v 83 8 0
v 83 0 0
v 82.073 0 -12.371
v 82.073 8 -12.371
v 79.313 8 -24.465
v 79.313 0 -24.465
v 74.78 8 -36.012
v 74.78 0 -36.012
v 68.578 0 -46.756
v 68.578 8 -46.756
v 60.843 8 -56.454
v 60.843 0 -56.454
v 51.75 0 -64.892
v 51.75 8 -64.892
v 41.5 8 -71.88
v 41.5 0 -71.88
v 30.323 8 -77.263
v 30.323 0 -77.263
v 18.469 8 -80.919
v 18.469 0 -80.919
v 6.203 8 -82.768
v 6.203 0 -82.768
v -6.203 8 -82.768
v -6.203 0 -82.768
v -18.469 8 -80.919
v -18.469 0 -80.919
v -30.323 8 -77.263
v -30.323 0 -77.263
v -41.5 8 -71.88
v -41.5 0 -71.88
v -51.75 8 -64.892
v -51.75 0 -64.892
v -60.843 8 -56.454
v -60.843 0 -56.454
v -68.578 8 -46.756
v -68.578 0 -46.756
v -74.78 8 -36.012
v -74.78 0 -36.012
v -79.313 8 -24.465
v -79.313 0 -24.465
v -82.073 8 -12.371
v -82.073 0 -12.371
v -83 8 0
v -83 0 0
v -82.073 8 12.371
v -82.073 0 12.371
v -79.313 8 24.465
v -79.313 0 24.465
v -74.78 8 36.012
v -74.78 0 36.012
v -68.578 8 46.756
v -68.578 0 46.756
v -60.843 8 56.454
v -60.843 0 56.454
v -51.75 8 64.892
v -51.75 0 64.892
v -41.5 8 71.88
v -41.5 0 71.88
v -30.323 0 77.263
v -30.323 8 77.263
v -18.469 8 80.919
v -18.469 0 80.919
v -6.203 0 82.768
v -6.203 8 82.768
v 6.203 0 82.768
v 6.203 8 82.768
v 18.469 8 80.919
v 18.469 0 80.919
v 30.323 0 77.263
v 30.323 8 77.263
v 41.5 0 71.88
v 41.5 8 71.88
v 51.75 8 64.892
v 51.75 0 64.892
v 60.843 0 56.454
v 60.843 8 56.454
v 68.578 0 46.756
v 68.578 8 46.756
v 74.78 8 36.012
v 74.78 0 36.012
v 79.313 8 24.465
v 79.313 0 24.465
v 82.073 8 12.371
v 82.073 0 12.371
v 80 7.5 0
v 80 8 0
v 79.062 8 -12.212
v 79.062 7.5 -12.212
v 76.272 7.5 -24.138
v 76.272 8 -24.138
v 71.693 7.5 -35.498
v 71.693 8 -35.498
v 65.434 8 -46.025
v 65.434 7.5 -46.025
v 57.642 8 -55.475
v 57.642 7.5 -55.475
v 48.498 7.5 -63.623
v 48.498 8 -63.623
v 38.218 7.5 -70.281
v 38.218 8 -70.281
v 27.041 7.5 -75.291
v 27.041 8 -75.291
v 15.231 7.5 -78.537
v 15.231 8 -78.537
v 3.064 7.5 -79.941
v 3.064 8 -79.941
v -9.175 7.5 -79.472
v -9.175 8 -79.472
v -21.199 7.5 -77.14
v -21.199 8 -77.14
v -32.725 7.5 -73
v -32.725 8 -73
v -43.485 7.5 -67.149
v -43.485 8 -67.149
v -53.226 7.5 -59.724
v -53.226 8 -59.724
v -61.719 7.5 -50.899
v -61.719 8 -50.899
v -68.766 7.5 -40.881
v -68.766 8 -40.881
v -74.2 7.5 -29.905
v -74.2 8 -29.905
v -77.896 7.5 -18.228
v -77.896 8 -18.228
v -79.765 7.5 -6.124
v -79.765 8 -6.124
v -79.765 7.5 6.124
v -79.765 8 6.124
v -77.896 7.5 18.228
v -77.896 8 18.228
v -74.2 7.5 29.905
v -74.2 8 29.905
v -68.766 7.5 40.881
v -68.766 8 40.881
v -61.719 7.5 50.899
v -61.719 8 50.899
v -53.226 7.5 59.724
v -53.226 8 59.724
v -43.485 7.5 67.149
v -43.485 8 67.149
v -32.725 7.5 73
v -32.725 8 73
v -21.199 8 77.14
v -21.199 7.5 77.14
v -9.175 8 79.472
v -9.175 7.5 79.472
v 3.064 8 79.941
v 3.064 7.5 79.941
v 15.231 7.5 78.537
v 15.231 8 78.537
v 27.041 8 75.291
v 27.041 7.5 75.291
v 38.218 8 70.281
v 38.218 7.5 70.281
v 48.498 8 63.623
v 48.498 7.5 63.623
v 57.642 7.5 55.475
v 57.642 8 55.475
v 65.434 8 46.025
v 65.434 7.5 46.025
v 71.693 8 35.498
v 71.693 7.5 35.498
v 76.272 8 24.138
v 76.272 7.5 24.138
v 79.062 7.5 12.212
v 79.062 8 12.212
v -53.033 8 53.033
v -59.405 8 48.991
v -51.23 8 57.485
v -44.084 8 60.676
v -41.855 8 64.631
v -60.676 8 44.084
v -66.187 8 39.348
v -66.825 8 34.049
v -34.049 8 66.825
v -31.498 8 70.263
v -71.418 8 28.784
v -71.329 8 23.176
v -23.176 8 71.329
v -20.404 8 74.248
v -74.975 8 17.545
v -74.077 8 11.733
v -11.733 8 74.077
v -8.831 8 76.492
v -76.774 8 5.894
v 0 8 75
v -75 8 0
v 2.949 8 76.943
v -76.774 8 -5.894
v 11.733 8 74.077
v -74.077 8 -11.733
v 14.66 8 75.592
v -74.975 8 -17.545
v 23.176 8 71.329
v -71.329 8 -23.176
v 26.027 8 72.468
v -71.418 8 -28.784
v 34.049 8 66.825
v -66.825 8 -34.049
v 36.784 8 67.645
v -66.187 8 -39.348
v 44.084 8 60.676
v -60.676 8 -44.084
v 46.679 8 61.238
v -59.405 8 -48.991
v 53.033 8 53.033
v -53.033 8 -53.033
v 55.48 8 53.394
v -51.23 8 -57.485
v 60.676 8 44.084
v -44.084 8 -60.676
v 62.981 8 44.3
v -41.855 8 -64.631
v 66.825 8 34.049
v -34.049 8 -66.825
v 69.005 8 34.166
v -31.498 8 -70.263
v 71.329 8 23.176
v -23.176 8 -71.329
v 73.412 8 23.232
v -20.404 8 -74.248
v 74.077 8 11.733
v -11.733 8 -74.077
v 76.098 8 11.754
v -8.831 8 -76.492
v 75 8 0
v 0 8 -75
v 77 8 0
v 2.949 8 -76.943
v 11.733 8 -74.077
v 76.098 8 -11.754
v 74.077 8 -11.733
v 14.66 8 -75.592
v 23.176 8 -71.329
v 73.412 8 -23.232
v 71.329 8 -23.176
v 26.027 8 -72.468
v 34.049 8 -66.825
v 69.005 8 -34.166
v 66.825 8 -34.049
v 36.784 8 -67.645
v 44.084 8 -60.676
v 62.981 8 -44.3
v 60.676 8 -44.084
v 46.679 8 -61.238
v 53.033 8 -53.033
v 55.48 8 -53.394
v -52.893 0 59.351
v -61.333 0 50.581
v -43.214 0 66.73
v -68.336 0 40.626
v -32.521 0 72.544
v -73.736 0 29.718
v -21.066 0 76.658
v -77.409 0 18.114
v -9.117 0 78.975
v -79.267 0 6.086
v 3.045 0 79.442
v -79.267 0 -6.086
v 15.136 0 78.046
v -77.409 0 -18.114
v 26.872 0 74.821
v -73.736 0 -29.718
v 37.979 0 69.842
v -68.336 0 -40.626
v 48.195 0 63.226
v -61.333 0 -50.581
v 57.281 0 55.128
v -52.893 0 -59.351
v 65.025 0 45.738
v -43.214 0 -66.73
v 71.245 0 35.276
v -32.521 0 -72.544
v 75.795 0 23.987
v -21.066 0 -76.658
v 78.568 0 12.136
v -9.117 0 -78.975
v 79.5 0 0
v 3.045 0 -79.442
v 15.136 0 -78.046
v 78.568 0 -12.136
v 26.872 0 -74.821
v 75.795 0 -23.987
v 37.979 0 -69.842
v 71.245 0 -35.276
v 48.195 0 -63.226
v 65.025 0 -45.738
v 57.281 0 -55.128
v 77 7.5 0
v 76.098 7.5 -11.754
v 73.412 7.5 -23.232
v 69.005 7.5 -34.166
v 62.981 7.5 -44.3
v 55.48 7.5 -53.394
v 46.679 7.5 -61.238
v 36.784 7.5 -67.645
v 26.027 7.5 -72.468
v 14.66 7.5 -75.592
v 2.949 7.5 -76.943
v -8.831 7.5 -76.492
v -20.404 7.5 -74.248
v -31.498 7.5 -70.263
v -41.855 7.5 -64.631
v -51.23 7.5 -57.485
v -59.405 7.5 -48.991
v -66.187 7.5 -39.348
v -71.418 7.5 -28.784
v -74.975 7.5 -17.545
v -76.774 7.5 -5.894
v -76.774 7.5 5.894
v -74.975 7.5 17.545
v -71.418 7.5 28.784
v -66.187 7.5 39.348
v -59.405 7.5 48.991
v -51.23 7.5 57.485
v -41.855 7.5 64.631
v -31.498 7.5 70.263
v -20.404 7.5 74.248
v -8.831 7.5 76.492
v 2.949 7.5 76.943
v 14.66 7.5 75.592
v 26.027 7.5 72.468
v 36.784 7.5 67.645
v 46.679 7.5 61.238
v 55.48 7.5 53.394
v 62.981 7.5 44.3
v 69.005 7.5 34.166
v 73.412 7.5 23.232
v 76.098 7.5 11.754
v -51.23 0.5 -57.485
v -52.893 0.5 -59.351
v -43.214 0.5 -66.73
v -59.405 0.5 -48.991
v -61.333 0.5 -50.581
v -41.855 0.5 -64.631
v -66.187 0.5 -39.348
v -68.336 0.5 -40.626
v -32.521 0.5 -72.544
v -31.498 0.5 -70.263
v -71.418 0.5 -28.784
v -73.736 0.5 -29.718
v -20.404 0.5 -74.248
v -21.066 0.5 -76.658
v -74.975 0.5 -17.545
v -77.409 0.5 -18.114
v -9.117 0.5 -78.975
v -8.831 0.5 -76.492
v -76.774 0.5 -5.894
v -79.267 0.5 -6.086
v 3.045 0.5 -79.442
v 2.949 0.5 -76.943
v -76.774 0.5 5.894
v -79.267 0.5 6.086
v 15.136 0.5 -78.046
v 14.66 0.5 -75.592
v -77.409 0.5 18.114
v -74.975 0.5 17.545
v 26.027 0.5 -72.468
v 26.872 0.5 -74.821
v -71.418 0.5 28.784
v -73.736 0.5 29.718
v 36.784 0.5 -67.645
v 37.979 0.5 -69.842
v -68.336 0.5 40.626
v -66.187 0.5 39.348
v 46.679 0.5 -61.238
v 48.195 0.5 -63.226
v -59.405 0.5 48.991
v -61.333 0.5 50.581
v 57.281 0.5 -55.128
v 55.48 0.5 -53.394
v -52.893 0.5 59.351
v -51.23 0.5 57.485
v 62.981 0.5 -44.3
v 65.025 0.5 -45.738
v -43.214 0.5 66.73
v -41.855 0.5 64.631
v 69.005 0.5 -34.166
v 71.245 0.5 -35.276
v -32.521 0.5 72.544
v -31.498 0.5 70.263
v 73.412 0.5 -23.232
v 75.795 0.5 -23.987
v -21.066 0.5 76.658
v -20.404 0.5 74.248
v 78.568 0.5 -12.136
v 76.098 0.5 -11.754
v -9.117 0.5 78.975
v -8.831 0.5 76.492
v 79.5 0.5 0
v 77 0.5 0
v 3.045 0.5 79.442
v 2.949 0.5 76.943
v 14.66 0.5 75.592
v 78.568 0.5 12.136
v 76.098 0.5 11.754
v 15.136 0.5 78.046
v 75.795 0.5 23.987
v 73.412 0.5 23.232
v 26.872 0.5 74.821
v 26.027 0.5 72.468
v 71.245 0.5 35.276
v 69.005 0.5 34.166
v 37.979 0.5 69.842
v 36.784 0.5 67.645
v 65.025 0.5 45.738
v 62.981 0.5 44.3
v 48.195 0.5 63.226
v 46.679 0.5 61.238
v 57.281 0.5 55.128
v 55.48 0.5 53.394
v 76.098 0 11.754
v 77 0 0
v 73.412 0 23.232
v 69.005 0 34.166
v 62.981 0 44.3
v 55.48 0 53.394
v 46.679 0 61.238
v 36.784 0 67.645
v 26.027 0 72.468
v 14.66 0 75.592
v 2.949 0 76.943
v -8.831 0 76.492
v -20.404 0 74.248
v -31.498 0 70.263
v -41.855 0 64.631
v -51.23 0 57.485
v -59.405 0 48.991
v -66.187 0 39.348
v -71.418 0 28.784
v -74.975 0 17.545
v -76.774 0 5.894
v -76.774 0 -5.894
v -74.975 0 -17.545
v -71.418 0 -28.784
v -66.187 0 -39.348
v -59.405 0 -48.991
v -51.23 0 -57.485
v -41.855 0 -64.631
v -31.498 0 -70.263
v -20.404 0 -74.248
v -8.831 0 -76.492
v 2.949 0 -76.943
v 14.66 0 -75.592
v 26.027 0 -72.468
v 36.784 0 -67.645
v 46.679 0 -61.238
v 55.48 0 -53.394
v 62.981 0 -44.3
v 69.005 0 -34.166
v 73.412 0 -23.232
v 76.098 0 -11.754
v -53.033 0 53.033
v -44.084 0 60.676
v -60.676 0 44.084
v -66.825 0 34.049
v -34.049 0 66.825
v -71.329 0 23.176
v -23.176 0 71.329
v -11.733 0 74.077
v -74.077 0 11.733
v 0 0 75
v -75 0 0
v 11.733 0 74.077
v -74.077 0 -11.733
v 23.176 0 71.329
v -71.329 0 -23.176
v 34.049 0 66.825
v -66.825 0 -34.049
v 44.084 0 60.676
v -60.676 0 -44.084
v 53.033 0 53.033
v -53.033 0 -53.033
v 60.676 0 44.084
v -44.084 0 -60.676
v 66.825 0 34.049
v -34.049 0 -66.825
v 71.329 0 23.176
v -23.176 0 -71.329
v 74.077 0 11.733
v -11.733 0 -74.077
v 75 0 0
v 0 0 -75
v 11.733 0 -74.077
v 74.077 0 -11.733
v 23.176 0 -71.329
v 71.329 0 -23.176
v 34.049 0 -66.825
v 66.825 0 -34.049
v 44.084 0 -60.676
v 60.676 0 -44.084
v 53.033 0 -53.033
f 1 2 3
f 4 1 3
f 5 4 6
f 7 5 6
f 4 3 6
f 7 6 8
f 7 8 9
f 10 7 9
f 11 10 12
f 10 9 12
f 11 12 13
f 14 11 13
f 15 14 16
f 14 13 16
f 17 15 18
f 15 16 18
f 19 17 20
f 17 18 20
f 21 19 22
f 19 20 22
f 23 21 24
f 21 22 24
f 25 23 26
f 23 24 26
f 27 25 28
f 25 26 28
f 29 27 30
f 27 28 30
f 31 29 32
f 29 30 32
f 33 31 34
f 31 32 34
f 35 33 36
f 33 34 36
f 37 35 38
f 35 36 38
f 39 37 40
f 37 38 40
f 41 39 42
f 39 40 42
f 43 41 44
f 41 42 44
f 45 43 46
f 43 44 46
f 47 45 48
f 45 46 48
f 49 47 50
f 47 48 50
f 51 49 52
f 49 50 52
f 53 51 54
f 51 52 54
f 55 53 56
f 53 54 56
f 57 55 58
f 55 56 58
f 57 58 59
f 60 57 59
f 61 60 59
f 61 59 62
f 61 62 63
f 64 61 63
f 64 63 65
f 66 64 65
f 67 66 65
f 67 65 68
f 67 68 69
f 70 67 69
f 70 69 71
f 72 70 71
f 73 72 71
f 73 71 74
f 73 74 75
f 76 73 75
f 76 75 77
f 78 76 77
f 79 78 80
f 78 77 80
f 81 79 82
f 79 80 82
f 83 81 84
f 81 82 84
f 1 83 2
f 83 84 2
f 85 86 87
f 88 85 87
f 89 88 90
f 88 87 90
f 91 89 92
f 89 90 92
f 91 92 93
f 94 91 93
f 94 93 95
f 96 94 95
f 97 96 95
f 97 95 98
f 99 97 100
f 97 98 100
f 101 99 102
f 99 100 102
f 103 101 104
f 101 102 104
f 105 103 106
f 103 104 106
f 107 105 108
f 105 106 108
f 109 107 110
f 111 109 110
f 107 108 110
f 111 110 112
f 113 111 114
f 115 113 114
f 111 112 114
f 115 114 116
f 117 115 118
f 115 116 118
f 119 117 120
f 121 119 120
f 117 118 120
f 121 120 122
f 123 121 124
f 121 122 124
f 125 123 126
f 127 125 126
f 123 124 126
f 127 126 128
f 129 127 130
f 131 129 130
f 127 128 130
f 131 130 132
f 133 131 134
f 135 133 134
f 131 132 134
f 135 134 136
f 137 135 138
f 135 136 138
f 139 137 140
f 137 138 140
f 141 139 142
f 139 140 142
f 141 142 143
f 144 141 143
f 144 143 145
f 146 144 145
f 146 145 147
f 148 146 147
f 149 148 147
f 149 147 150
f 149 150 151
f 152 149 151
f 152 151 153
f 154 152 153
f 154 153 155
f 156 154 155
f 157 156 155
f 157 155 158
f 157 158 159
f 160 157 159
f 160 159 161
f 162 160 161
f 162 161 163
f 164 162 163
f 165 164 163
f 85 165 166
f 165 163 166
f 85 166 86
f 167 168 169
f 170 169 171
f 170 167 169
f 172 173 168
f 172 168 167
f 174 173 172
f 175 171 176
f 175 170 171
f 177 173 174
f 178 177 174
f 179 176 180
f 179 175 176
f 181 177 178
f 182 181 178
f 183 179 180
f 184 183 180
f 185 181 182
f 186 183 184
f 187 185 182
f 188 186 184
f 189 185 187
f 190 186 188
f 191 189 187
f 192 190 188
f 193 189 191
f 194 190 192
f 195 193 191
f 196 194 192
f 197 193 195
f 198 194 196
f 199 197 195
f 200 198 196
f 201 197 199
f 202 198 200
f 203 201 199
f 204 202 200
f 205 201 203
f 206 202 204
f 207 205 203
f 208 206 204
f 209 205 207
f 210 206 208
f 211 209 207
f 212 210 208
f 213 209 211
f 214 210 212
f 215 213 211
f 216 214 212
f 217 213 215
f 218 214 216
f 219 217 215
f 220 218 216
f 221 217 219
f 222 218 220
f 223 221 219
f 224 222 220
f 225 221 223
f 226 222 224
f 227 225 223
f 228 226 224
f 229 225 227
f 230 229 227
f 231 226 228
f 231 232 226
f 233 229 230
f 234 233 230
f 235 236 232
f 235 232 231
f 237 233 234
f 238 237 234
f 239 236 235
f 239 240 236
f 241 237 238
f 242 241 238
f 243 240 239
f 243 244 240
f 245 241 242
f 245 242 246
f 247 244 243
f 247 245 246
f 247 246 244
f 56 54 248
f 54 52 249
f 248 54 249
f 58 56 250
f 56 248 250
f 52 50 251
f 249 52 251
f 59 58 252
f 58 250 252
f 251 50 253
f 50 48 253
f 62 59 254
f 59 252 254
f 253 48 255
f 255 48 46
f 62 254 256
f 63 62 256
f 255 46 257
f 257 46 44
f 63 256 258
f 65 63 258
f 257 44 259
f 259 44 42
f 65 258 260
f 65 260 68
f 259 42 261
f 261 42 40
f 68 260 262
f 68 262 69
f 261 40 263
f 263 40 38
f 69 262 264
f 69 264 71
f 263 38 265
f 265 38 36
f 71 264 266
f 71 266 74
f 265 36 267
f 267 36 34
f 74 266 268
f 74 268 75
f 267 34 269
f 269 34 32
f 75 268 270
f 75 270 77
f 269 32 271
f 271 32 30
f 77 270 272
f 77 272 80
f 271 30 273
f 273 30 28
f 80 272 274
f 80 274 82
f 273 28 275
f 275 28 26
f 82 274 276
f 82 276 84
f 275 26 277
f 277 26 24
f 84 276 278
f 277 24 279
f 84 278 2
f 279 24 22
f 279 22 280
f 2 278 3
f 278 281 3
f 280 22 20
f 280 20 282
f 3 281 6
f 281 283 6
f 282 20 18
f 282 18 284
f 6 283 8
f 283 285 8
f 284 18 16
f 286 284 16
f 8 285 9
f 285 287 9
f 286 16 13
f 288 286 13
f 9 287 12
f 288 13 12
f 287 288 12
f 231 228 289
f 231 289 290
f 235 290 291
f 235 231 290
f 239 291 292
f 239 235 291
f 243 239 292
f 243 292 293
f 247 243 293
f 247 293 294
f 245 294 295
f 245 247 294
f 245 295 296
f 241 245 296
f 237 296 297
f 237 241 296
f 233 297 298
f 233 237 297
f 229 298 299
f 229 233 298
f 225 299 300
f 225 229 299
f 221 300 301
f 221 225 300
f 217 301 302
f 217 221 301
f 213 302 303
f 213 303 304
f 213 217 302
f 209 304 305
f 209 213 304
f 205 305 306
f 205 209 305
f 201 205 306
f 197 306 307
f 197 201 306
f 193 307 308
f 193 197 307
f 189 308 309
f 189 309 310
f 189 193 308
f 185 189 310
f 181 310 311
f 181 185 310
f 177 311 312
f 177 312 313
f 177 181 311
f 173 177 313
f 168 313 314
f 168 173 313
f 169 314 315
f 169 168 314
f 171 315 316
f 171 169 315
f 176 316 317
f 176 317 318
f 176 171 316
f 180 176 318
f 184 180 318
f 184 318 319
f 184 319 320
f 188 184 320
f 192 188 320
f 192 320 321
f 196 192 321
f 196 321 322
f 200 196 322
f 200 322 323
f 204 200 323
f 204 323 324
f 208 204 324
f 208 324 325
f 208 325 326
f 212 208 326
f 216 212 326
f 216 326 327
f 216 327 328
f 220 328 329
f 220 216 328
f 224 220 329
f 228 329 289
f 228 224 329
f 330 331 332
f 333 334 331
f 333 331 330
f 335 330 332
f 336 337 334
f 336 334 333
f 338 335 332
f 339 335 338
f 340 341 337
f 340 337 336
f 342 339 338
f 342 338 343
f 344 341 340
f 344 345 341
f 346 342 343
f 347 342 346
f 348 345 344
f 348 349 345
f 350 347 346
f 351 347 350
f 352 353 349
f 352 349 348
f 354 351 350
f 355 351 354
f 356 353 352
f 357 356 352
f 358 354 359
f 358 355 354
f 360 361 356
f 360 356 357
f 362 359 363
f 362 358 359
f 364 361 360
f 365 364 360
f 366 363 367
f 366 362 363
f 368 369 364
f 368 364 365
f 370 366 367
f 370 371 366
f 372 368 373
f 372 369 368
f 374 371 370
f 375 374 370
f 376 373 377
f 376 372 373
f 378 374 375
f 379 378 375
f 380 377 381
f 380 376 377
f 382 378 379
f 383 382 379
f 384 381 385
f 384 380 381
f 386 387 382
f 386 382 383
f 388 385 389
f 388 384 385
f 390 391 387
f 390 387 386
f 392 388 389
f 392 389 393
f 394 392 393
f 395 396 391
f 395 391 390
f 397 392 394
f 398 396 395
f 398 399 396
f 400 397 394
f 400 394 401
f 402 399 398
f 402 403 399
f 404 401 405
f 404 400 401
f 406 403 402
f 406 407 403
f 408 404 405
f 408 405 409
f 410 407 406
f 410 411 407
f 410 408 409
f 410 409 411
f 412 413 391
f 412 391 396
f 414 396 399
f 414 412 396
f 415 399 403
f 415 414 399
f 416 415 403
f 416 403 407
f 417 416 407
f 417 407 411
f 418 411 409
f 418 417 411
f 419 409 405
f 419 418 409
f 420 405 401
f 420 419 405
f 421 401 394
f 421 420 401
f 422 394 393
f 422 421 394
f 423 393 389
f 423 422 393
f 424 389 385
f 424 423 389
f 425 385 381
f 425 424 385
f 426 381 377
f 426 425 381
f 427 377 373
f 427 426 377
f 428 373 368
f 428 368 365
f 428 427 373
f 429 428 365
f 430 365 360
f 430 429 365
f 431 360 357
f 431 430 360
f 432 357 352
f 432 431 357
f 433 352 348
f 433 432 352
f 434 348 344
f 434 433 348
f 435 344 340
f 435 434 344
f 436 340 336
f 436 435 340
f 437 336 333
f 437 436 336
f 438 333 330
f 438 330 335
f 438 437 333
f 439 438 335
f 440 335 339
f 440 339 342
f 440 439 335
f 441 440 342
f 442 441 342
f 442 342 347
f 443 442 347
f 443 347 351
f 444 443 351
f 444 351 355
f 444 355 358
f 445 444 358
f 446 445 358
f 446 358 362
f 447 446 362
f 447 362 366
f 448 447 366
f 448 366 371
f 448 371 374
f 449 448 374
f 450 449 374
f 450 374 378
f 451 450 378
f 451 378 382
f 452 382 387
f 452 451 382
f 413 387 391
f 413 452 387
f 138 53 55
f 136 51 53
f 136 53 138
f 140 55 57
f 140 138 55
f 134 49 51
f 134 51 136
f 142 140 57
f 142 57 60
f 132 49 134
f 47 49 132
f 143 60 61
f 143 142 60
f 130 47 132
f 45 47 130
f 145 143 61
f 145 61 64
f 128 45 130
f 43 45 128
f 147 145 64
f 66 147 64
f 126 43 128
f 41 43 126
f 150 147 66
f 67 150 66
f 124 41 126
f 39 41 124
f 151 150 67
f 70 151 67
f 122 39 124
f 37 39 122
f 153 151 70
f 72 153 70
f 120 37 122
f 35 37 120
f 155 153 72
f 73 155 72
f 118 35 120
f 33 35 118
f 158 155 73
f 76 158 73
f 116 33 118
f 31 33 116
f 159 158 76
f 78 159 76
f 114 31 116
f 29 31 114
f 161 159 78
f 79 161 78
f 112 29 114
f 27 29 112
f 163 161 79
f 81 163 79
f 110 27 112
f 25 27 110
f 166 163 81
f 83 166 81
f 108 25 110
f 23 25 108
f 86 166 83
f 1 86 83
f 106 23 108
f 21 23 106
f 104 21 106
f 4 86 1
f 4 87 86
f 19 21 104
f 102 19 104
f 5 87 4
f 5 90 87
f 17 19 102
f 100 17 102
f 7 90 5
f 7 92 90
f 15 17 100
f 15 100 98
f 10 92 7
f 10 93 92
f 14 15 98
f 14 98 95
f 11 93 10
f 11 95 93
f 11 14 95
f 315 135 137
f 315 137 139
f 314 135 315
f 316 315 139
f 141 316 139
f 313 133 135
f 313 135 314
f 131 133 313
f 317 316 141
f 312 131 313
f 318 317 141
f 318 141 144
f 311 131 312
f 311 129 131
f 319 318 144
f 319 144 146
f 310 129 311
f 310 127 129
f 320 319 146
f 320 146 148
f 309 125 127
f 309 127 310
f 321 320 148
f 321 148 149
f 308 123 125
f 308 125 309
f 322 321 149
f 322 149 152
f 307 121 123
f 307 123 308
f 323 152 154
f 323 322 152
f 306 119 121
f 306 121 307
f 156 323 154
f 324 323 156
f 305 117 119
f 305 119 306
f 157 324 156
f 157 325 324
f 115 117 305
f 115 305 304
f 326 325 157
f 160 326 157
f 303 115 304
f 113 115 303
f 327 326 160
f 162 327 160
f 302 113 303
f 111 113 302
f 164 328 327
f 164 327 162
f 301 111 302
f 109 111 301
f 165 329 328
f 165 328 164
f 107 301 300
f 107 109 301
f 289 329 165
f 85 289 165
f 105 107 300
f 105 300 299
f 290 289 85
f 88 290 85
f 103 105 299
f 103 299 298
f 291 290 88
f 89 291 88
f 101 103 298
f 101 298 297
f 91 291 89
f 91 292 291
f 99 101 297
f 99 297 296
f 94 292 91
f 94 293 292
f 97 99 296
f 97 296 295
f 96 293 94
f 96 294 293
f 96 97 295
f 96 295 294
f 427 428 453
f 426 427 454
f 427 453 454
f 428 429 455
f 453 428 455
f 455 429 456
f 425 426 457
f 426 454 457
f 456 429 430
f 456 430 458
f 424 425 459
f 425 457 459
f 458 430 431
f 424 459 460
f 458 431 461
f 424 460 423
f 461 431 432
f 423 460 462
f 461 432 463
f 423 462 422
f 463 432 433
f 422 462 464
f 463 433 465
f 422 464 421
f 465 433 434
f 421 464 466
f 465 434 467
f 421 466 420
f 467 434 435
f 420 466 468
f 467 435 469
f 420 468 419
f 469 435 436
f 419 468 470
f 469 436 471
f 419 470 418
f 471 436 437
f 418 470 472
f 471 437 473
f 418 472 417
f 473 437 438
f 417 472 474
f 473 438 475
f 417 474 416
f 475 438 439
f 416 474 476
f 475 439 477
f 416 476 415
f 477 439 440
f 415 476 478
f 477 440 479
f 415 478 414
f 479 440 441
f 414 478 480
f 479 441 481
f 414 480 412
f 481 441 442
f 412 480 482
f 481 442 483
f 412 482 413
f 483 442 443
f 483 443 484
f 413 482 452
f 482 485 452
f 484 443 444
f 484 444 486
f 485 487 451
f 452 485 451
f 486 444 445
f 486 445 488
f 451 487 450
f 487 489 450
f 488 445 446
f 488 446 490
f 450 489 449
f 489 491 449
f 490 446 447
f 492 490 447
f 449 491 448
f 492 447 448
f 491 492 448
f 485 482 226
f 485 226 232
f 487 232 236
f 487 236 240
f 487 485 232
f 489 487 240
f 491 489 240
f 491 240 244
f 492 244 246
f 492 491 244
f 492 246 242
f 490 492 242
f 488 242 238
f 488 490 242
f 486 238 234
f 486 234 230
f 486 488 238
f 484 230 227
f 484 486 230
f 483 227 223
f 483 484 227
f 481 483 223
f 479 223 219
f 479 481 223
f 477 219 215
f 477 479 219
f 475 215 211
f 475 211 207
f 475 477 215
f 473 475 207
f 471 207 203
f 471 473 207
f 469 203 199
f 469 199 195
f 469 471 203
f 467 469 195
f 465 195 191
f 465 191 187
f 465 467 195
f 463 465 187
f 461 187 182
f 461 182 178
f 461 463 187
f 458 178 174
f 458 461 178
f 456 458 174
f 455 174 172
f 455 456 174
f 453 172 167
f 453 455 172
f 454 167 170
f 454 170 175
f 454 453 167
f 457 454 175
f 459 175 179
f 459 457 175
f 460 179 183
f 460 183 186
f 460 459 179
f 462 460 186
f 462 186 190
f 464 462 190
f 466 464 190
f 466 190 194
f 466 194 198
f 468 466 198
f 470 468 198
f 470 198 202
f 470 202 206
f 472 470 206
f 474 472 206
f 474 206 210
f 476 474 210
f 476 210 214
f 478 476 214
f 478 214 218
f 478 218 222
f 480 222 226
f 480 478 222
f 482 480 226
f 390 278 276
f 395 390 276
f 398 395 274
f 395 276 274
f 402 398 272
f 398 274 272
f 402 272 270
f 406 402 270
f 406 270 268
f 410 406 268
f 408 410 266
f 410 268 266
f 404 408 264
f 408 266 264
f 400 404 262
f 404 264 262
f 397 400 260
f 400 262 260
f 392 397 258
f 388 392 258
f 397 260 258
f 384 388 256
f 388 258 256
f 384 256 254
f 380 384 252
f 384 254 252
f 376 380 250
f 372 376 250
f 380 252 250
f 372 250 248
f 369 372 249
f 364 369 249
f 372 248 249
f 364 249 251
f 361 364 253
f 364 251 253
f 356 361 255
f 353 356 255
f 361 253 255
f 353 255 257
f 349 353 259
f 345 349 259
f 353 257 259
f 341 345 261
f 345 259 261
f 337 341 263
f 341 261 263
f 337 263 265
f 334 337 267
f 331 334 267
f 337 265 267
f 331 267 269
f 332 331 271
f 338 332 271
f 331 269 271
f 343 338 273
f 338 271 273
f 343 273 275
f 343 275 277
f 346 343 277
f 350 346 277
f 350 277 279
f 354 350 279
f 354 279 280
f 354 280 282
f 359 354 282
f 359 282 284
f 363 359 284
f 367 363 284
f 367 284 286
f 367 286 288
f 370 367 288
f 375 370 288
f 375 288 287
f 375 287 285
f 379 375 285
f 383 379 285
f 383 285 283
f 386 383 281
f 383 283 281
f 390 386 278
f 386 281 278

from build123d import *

# Parameters (mm, degrees)
SKETCH_1_R          = 83
SKETCH_1_R_2        = 75
EXTRUDE_1_DEPTH     = 8
SKETCH_2_R          = 80
SKETCH_2_R_2        = 77
CUT_EXTRUDE_1_DEPTH = 0.5
SKETCH_3_R          = 79.5
SKETCH_3_R_2        = 77
CUT_EXTRUDE_2_DEPTH = 0.5


with BuildPart() as part:
    # 草图1 → 凸台-拉伸1 (new body)
    with BuildSketch(Plane(origin=(0, 0, 0), x_dir=(1, 0, 0), z_dir=(0, 1, 0))):
        Circle(SKETCH_1_R)
        Circle(SKETCH_1_R_2, mode=Mode.SUBTRACT)
    extrude(amount=EXTRUDE_1_DEPTH)

    # 草图2 → 切除-拉伸1 (cut)
    with BuildSketch(Plane(origin=(0, 8, 0), x_dir=(1, 0, 0), z_dir=(0, 1, 0))):
        Circle(SKETCH_2_R)
        Circle(SKETCH_2_R_2, mode=Mode.SUBTRACT)
    extrude(amount=-CUT_EXTRUDE_1_DEPTH, mode=Mode.SUBTRACT)

    # 草图3 → 切除-拉伸2 (cut)
    with BuildSketch(Plane.XZ):
        Circle(SKETCH_3_R)
        Circle(SKETCH_3_R_2, mode=Mode.SUBTRACT)
    extrude(amount=-CUT_EXTRUDE_2_DEPTH, mode=Mode.SUBTRACT)


solid = part.part
